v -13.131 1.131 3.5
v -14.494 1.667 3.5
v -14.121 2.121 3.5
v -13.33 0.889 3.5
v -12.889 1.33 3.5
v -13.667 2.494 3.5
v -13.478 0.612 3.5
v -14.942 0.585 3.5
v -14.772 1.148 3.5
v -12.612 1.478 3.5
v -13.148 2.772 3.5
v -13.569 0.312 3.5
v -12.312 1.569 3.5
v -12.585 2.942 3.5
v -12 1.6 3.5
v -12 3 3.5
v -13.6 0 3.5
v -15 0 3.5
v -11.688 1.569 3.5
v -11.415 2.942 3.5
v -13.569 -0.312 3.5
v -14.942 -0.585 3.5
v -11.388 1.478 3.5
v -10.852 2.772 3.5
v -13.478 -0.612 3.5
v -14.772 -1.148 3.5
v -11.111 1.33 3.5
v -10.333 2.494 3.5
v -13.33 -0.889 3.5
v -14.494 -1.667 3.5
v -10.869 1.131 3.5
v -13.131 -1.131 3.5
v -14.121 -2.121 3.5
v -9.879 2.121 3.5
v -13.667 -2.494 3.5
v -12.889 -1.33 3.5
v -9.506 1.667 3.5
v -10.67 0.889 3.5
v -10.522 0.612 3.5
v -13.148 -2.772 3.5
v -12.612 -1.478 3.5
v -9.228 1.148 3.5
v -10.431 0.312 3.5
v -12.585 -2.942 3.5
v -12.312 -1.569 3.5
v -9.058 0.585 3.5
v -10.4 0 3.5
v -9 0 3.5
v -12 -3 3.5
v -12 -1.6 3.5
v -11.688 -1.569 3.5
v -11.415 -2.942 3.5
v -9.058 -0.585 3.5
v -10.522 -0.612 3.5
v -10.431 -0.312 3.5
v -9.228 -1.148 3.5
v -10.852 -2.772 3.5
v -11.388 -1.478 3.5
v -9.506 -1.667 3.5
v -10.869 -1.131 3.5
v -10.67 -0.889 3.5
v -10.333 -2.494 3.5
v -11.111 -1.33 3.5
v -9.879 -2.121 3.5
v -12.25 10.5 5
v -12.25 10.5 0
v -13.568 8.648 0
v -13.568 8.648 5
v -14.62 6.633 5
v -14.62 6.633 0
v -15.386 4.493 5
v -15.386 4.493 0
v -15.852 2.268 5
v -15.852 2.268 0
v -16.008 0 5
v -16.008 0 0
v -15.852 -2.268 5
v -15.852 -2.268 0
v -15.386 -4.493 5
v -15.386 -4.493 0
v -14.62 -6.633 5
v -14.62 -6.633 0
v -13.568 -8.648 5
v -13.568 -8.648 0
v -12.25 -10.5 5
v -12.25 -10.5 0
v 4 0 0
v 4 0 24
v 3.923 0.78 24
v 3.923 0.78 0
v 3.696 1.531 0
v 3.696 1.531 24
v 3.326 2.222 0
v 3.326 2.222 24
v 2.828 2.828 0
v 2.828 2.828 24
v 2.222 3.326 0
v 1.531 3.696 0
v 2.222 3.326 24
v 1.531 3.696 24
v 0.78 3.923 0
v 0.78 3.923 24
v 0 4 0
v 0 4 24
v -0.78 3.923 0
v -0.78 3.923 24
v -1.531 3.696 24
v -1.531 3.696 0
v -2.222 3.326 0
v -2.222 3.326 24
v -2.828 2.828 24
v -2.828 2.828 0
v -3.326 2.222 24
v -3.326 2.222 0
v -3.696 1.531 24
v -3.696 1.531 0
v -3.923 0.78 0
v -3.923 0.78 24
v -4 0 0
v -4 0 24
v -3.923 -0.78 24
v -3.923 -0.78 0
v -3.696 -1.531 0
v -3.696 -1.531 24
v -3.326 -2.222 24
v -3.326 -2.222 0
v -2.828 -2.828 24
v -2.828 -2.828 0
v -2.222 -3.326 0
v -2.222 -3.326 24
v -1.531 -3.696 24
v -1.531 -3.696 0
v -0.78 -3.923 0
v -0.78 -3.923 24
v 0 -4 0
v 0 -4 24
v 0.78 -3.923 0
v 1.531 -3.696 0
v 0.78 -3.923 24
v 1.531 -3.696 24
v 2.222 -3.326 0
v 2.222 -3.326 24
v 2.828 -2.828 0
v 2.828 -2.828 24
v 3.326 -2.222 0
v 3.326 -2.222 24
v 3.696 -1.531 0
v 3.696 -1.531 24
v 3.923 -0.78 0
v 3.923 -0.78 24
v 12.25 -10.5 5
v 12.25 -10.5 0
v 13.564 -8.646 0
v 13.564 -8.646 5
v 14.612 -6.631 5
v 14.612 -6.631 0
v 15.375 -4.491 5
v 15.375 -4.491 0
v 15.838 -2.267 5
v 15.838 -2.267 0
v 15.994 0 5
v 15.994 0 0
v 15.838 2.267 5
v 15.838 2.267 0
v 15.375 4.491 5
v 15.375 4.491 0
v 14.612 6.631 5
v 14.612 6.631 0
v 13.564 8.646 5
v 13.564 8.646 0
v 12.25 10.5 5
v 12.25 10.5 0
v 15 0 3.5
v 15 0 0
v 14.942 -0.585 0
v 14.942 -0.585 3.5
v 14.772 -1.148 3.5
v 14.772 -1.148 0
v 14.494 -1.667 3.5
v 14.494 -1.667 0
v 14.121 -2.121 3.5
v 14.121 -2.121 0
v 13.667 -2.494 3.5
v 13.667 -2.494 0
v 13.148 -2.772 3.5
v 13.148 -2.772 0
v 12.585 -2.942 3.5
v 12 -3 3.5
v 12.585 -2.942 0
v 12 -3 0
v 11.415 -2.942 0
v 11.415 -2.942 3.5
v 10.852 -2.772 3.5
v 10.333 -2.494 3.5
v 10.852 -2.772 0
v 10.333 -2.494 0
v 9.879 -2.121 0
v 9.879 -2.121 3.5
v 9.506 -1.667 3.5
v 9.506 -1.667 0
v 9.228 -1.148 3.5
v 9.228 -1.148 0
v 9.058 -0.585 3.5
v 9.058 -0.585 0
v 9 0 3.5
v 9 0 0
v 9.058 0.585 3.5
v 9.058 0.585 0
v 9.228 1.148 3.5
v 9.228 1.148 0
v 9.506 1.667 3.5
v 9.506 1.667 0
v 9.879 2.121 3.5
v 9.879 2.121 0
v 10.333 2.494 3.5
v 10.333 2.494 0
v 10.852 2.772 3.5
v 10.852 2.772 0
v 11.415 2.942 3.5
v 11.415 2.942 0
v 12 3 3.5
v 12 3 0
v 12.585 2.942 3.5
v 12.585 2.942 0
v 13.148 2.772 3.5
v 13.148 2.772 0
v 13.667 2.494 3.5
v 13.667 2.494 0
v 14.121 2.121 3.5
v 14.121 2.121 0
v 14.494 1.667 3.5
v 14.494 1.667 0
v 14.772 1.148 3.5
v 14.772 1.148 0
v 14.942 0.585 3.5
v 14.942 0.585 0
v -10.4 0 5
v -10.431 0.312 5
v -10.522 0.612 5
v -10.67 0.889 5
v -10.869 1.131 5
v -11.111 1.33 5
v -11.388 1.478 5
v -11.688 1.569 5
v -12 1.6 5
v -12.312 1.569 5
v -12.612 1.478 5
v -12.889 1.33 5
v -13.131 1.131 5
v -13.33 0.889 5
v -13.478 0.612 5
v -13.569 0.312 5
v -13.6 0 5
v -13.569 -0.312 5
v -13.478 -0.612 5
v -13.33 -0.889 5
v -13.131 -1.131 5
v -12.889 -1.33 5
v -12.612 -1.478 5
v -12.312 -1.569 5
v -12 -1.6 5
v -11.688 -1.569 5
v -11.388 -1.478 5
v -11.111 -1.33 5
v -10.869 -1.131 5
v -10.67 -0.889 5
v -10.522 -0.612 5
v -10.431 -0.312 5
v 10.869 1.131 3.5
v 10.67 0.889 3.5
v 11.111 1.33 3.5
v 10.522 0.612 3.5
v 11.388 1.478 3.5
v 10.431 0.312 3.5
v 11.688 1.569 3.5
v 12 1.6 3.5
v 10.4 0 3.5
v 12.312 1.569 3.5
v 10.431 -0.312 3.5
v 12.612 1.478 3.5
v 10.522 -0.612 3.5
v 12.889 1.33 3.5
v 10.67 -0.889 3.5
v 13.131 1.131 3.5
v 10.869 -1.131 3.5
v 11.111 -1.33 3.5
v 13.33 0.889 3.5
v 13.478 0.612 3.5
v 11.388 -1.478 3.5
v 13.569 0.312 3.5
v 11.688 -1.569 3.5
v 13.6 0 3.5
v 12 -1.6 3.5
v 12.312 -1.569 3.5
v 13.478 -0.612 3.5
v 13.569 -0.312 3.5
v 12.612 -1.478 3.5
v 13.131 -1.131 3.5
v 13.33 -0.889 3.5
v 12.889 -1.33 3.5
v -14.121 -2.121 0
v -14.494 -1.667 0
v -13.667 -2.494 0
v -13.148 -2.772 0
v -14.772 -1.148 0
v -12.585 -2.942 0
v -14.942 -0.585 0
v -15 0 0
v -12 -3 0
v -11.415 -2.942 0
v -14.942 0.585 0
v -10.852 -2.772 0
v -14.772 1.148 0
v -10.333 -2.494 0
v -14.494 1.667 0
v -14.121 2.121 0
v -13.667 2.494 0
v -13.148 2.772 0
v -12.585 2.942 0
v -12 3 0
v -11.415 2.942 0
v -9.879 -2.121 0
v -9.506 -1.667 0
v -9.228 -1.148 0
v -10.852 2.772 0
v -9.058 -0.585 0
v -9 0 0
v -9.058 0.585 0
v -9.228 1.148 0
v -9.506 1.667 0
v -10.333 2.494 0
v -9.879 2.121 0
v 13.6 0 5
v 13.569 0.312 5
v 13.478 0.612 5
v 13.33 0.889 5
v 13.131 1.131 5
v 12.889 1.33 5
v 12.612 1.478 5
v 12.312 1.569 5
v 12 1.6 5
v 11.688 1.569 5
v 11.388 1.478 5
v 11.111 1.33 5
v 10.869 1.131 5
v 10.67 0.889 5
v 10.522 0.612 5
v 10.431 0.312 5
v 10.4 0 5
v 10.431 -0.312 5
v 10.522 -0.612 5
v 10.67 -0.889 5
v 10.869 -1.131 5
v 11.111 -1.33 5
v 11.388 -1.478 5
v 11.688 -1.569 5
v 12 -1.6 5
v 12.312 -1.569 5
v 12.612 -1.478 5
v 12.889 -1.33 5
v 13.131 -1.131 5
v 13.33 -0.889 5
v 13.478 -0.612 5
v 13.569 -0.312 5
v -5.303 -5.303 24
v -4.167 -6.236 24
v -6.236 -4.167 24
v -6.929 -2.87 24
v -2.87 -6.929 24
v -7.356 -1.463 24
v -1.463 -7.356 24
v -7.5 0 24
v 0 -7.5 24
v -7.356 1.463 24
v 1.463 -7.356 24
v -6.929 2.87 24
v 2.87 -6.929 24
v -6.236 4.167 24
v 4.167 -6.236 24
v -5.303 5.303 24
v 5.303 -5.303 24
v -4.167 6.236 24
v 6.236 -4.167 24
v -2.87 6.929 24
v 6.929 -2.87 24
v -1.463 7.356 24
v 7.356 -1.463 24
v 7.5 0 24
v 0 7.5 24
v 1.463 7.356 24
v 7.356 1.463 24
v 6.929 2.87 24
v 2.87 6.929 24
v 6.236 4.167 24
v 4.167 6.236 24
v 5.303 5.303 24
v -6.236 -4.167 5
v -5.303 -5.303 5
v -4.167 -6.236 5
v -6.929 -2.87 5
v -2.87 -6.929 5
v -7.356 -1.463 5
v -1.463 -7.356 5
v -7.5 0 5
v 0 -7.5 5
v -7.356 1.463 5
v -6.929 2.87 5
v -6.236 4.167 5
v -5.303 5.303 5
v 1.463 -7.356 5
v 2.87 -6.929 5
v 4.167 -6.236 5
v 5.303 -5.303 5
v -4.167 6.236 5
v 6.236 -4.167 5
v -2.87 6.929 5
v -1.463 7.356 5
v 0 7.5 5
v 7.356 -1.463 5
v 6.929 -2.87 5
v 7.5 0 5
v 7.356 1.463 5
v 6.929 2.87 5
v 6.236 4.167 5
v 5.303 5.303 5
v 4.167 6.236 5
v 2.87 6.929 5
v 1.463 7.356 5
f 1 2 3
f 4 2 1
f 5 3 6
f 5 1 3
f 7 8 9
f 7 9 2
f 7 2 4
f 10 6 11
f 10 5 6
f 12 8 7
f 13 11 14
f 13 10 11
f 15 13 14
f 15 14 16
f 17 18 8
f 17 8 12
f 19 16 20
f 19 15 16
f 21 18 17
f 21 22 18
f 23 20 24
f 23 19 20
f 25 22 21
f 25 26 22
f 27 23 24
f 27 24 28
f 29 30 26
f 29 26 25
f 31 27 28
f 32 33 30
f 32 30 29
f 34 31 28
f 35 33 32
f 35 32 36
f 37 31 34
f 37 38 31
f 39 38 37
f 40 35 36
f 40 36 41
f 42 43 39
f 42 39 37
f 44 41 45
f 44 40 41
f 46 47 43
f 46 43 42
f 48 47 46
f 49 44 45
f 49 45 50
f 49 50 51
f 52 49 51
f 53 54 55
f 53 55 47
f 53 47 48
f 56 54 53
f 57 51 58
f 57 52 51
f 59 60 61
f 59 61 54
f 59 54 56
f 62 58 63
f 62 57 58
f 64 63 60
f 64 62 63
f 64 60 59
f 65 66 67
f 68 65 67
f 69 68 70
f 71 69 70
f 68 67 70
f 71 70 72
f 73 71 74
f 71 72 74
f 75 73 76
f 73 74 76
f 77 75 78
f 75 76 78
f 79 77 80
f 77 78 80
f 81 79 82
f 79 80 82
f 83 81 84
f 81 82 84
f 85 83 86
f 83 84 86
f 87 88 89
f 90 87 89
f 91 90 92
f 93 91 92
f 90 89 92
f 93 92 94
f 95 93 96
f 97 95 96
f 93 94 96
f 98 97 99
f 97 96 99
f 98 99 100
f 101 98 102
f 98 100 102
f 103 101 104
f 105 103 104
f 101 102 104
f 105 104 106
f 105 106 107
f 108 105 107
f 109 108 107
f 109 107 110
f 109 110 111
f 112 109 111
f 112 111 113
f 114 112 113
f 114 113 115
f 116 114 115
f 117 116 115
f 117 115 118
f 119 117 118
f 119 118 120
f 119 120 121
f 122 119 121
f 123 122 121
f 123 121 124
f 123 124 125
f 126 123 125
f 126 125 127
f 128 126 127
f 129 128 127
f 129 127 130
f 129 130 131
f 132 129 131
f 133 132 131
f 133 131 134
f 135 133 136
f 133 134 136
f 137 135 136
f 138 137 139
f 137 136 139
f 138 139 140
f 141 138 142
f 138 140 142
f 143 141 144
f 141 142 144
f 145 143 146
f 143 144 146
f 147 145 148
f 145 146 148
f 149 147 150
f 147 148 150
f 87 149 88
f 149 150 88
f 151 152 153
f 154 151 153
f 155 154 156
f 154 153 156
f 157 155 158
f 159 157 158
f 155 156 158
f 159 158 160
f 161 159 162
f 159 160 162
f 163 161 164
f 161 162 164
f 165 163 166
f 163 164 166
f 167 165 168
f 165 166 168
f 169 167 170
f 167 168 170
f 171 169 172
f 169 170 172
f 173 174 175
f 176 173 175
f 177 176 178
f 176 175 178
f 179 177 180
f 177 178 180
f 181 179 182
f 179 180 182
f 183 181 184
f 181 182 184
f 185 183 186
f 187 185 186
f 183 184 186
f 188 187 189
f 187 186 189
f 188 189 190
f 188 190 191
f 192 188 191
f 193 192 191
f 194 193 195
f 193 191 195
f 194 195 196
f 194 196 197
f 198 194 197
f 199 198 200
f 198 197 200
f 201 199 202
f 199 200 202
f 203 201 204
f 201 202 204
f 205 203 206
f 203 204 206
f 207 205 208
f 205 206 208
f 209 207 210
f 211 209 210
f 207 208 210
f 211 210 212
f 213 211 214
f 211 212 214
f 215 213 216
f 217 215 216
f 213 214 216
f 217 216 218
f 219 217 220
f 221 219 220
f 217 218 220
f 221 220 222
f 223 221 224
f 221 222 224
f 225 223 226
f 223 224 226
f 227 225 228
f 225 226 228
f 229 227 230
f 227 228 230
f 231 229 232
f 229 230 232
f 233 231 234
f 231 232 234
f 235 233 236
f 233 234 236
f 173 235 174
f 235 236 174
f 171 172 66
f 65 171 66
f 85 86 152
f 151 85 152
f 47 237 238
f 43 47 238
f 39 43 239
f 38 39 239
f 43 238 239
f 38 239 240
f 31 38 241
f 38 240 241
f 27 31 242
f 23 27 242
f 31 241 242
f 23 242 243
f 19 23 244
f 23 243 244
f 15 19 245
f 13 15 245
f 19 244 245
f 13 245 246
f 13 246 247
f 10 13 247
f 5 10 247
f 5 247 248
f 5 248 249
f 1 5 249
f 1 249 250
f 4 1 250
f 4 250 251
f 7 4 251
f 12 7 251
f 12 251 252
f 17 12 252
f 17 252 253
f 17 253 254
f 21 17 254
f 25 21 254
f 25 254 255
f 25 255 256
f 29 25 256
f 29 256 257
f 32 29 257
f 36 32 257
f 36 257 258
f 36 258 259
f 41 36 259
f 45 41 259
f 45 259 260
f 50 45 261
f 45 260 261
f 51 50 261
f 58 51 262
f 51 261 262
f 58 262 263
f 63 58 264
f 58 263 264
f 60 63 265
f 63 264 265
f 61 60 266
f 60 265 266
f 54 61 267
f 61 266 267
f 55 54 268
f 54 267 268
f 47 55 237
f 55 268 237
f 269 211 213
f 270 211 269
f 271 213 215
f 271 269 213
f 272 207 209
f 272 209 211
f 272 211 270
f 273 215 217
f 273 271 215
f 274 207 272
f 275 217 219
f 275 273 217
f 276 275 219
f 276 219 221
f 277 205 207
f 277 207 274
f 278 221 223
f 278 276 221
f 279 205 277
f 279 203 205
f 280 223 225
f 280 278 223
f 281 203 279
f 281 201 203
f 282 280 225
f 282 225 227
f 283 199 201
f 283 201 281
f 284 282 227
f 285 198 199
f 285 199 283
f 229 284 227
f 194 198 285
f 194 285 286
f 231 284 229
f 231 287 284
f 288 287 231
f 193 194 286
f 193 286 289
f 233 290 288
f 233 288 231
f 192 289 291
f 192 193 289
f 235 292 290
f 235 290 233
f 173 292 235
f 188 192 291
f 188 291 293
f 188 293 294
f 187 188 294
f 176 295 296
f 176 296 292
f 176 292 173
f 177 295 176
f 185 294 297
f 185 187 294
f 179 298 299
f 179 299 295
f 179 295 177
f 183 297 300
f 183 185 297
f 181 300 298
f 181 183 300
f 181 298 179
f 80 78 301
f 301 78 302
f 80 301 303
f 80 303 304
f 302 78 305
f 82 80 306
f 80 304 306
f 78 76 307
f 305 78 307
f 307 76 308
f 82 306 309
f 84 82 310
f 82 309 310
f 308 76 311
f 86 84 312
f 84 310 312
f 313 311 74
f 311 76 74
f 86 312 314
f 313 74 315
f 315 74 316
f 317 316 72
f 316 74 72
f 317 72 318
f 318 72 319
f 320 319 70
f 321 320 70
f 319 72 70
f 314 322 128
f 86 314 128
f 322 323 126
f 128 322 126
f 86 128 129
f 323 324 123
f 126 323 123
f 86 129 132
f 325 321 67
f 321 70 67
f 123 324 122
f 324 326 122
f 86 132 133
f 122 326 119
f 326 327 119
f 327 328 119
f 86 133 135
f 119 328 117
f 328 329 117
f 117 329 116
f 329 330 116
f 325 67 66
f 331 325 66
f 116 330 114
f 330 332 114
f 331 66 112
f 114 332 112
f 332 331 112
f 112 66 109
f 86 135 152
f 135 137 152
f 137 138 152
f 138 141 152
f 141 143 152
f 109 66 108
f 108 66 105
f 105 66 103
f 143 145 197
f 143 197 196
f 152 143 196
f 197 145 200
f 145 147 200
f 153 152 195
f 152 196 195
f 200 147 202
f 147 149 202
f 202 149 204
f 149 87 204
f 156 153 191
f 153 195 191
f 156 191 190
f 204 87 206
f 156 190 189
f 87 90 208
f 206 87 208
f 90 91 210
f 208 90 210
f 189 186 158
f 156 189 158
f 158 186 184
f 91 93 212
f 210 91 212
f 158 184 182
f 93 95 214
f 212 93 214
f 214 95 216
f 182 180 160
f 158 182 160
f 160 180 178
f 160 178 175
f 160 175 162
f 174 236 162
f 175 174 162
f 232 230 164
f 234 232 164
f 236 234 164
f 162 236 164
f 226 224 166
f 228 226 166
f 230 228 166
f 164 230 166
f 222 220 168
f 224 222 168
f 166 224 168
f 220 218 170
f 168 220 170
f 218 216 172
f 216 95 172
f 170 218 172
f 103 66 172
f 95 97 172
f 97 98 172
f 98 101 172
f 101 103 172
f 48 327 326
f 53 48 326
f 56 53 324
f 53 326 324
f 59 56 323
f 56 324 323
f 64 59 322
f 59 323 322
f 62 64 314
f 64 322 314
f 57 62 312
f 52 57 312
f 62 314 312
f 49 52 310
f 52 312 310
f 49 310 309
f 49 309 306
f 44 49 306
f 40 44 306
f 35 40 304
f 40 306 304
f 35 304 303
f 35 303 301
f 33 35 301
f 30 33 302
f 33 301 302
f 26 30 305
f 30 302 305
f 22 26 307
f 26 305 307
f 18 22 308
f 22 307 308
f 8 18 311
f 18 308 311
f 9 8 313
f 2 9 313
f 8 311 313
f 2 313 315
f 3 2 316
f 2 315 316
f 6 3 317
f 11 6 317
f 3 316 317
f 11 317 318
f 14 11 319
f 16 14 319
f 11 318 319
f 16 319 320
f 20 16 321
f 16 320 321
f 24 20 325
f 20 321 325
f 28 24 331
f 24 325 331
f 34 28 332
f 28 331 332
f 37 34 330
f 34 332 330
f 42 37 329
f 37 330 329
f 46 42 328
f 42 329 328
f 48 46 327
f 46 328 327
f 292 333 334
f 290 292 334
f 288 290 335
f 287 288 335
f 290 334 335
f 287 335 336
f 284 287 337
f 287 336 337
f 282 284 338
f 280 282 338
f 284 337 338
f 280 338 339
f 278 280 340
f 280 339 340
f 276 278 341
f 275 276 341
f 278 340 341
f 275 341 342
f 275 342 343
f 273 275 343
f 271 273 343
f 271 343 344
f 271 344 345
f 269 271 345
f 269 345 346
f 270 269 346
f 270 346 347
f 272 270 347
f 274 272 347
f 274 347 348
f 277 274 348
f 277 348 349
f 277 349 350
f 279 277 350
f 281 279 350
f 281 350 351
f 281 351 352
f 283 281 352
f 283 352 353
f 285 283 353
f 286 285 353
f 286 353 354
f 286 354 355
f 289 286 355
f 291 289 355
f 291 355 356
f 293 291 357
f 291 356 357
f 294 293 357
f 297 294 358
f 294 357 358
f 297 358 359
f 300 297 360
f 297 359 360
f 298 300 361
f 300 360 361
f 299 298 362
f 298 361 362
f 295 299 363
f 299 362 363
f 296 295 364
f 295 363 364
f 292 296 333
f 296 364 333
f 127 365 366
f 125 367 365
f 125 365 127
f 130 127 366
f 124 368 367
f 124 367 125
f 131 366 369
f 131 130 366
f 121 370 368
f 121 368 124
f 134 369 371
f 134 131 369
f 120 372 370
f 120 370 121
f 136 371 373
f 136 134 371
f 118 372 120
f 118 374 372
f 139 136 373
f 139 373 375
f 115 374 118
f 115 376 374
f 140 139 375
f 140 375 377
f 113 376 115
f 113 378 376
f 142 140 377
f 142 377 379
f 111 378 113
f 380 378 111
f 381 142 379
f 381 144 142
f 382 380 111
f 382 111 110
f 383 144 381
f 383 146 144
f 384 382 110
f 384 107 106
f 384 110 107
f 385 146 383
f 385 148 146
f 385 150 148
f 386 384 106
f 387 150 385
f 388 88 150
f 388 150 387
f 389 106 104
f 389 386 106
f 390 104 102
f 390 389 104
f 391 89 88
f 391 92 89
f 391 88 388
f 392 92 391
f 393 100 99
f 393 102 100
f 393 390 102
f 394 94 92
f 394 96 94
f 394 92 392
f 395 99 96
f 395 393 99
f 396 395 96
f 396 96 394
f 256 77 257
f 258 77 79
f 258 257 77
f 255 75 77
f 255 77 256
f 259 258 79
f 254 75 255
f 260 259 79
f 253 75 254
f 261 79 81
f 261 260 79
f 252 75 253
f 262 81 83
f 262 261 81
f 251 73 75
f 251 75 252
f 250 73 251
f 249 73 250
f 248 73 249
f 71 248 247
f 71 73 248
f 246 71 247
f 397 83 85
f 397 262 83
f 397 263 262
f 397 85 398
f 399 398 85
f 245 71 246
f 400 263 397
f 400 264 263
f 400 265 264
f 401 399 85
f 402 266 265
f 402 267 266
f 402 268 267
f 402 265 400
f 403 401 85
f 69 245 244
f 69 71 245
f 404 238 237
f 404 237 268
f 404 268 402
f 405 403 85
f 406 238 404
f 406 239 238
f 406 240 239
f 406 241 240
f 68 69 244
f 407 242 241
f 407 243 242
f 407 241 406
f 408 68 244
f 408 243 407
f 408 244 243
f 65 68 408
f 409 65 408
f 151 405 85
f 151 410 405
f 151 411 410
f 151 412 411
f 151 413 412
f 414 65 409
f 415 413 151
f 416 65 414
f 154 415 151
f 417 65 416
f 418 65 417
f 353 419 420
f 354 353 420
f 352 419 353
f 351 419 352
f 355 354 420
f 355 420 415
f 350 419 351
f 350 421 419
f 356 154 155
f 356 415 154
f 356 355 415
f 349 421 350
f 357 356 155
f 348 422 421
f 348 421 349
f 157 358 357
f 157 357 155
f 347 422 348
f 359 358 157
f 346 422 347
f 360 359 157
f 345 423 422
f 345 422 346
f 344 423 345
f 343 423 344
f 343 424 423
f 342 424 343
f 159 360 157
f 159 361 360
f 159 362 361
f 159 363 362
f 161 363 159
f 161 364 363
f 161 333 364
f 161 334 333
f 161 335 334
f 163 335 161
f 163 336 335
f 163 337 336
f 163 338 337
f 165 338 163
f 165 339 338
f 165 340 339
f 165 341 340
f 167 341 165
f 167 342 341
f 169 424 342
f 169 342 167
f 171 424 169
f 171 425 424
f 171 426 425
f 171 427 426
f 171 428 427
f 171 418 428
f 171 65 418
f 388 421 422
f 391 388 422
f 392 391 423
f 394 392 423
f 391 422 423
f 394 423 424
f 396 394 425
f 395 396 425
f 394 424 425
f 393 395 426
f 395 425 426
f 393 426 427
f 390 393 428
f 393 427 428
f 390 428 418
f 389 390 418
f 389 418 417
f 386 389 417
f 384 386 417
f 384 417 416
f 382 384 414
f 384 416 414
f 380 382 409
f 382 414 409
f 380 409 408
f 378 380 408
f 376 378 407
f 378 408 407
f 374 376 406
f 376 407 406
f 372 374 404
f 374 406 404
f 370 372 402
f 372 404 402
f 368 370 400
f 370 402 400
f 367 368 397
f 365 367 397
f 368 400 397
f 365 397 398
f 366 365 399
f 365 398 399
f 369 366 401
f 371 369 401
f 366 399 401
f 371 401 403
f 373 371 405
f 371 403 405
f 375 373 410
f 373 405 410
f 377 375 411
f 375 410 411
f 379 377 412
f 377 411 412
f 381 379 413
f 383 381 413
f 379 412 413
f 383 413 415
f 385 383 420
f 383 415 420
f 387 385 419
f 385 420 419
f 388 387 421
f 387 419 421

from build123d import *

# Parameters (mm, degrees)
PAD_DEPTH       = 5
SKETCH001_R     = 1.6
POCKET_DEPTH    = 5.001
SKETCH002_R     = 7.5
PAD001_DEPTH    = 19
SKETCH003_R     = 4
POCKET001_DEPTH = 24.001
SKETCH004_R     = 3
POCKET002_DEPTH = 3.5


with BuildPart() as part:
    # Sketch → Pad (new body)
    with BuildSketch(Plane.XY):
        with BuildLine():
            Line((-12.25, -10.5), (12.25, -10.5))
            ThreePointArc((12.25, -10.5), (15.993585, 0), (12.25, 10.5))
            Line((12.25, 10.5), (-12.25, 10.5))
            ThreePointArc((-12.25, 10.5), (-16.007739, 0), (-12.25, -10.5))
        make_face()
    extrude(amount=PAD_DEPTH)

    # Sketch001 (on Face6 of Pad) → Pocket (cut, through all)
    with BuildSketch(Plane.XY.offset(5)):
        with Locations((-12, 0)):
            Circle(SKETCH001_R)
        with Locations((12, 0)):
            Circle(SKETCH001_R)
    extrude(amount=-POCKET_DEPTH, mode=Mode.SUBTRACT)

    # Sketch002 (on Face5 of Pocket) → Pad001 (join)
    with BuildSketch(Plane.XY.offset(5)):
        Circle(SKETCH002_R)
    extrude(amount=PAD001_DEPTH)

    # Sketch003 (on Face10 of Pad001) → Pocket001 (cut, through all)
    with BuildSketch(Plane.XY.offset(24)):
        Circle(SKETCH003_R)
    extrude(amount=-POCKET001_DEPTH, mode=Mode.SUBTRACT)

    # Sketch004 (on Face4 of Pocket001) → Pocket002 (cut)
    with BuildSketch(Plane(origin=(0, 0, 0), x_dir=(1, 0, 0), z_dir=(0, 0, -1))):
        with Locations((-12, 0)):
            Circle(SKETCH004_R)
        with Locations((12, 0)):
            Circle(SKETCH004_R)
    extrude(amount=-POCKET002_DEPTH, mode=Mode.SUBTRACT)


solid = part.part
